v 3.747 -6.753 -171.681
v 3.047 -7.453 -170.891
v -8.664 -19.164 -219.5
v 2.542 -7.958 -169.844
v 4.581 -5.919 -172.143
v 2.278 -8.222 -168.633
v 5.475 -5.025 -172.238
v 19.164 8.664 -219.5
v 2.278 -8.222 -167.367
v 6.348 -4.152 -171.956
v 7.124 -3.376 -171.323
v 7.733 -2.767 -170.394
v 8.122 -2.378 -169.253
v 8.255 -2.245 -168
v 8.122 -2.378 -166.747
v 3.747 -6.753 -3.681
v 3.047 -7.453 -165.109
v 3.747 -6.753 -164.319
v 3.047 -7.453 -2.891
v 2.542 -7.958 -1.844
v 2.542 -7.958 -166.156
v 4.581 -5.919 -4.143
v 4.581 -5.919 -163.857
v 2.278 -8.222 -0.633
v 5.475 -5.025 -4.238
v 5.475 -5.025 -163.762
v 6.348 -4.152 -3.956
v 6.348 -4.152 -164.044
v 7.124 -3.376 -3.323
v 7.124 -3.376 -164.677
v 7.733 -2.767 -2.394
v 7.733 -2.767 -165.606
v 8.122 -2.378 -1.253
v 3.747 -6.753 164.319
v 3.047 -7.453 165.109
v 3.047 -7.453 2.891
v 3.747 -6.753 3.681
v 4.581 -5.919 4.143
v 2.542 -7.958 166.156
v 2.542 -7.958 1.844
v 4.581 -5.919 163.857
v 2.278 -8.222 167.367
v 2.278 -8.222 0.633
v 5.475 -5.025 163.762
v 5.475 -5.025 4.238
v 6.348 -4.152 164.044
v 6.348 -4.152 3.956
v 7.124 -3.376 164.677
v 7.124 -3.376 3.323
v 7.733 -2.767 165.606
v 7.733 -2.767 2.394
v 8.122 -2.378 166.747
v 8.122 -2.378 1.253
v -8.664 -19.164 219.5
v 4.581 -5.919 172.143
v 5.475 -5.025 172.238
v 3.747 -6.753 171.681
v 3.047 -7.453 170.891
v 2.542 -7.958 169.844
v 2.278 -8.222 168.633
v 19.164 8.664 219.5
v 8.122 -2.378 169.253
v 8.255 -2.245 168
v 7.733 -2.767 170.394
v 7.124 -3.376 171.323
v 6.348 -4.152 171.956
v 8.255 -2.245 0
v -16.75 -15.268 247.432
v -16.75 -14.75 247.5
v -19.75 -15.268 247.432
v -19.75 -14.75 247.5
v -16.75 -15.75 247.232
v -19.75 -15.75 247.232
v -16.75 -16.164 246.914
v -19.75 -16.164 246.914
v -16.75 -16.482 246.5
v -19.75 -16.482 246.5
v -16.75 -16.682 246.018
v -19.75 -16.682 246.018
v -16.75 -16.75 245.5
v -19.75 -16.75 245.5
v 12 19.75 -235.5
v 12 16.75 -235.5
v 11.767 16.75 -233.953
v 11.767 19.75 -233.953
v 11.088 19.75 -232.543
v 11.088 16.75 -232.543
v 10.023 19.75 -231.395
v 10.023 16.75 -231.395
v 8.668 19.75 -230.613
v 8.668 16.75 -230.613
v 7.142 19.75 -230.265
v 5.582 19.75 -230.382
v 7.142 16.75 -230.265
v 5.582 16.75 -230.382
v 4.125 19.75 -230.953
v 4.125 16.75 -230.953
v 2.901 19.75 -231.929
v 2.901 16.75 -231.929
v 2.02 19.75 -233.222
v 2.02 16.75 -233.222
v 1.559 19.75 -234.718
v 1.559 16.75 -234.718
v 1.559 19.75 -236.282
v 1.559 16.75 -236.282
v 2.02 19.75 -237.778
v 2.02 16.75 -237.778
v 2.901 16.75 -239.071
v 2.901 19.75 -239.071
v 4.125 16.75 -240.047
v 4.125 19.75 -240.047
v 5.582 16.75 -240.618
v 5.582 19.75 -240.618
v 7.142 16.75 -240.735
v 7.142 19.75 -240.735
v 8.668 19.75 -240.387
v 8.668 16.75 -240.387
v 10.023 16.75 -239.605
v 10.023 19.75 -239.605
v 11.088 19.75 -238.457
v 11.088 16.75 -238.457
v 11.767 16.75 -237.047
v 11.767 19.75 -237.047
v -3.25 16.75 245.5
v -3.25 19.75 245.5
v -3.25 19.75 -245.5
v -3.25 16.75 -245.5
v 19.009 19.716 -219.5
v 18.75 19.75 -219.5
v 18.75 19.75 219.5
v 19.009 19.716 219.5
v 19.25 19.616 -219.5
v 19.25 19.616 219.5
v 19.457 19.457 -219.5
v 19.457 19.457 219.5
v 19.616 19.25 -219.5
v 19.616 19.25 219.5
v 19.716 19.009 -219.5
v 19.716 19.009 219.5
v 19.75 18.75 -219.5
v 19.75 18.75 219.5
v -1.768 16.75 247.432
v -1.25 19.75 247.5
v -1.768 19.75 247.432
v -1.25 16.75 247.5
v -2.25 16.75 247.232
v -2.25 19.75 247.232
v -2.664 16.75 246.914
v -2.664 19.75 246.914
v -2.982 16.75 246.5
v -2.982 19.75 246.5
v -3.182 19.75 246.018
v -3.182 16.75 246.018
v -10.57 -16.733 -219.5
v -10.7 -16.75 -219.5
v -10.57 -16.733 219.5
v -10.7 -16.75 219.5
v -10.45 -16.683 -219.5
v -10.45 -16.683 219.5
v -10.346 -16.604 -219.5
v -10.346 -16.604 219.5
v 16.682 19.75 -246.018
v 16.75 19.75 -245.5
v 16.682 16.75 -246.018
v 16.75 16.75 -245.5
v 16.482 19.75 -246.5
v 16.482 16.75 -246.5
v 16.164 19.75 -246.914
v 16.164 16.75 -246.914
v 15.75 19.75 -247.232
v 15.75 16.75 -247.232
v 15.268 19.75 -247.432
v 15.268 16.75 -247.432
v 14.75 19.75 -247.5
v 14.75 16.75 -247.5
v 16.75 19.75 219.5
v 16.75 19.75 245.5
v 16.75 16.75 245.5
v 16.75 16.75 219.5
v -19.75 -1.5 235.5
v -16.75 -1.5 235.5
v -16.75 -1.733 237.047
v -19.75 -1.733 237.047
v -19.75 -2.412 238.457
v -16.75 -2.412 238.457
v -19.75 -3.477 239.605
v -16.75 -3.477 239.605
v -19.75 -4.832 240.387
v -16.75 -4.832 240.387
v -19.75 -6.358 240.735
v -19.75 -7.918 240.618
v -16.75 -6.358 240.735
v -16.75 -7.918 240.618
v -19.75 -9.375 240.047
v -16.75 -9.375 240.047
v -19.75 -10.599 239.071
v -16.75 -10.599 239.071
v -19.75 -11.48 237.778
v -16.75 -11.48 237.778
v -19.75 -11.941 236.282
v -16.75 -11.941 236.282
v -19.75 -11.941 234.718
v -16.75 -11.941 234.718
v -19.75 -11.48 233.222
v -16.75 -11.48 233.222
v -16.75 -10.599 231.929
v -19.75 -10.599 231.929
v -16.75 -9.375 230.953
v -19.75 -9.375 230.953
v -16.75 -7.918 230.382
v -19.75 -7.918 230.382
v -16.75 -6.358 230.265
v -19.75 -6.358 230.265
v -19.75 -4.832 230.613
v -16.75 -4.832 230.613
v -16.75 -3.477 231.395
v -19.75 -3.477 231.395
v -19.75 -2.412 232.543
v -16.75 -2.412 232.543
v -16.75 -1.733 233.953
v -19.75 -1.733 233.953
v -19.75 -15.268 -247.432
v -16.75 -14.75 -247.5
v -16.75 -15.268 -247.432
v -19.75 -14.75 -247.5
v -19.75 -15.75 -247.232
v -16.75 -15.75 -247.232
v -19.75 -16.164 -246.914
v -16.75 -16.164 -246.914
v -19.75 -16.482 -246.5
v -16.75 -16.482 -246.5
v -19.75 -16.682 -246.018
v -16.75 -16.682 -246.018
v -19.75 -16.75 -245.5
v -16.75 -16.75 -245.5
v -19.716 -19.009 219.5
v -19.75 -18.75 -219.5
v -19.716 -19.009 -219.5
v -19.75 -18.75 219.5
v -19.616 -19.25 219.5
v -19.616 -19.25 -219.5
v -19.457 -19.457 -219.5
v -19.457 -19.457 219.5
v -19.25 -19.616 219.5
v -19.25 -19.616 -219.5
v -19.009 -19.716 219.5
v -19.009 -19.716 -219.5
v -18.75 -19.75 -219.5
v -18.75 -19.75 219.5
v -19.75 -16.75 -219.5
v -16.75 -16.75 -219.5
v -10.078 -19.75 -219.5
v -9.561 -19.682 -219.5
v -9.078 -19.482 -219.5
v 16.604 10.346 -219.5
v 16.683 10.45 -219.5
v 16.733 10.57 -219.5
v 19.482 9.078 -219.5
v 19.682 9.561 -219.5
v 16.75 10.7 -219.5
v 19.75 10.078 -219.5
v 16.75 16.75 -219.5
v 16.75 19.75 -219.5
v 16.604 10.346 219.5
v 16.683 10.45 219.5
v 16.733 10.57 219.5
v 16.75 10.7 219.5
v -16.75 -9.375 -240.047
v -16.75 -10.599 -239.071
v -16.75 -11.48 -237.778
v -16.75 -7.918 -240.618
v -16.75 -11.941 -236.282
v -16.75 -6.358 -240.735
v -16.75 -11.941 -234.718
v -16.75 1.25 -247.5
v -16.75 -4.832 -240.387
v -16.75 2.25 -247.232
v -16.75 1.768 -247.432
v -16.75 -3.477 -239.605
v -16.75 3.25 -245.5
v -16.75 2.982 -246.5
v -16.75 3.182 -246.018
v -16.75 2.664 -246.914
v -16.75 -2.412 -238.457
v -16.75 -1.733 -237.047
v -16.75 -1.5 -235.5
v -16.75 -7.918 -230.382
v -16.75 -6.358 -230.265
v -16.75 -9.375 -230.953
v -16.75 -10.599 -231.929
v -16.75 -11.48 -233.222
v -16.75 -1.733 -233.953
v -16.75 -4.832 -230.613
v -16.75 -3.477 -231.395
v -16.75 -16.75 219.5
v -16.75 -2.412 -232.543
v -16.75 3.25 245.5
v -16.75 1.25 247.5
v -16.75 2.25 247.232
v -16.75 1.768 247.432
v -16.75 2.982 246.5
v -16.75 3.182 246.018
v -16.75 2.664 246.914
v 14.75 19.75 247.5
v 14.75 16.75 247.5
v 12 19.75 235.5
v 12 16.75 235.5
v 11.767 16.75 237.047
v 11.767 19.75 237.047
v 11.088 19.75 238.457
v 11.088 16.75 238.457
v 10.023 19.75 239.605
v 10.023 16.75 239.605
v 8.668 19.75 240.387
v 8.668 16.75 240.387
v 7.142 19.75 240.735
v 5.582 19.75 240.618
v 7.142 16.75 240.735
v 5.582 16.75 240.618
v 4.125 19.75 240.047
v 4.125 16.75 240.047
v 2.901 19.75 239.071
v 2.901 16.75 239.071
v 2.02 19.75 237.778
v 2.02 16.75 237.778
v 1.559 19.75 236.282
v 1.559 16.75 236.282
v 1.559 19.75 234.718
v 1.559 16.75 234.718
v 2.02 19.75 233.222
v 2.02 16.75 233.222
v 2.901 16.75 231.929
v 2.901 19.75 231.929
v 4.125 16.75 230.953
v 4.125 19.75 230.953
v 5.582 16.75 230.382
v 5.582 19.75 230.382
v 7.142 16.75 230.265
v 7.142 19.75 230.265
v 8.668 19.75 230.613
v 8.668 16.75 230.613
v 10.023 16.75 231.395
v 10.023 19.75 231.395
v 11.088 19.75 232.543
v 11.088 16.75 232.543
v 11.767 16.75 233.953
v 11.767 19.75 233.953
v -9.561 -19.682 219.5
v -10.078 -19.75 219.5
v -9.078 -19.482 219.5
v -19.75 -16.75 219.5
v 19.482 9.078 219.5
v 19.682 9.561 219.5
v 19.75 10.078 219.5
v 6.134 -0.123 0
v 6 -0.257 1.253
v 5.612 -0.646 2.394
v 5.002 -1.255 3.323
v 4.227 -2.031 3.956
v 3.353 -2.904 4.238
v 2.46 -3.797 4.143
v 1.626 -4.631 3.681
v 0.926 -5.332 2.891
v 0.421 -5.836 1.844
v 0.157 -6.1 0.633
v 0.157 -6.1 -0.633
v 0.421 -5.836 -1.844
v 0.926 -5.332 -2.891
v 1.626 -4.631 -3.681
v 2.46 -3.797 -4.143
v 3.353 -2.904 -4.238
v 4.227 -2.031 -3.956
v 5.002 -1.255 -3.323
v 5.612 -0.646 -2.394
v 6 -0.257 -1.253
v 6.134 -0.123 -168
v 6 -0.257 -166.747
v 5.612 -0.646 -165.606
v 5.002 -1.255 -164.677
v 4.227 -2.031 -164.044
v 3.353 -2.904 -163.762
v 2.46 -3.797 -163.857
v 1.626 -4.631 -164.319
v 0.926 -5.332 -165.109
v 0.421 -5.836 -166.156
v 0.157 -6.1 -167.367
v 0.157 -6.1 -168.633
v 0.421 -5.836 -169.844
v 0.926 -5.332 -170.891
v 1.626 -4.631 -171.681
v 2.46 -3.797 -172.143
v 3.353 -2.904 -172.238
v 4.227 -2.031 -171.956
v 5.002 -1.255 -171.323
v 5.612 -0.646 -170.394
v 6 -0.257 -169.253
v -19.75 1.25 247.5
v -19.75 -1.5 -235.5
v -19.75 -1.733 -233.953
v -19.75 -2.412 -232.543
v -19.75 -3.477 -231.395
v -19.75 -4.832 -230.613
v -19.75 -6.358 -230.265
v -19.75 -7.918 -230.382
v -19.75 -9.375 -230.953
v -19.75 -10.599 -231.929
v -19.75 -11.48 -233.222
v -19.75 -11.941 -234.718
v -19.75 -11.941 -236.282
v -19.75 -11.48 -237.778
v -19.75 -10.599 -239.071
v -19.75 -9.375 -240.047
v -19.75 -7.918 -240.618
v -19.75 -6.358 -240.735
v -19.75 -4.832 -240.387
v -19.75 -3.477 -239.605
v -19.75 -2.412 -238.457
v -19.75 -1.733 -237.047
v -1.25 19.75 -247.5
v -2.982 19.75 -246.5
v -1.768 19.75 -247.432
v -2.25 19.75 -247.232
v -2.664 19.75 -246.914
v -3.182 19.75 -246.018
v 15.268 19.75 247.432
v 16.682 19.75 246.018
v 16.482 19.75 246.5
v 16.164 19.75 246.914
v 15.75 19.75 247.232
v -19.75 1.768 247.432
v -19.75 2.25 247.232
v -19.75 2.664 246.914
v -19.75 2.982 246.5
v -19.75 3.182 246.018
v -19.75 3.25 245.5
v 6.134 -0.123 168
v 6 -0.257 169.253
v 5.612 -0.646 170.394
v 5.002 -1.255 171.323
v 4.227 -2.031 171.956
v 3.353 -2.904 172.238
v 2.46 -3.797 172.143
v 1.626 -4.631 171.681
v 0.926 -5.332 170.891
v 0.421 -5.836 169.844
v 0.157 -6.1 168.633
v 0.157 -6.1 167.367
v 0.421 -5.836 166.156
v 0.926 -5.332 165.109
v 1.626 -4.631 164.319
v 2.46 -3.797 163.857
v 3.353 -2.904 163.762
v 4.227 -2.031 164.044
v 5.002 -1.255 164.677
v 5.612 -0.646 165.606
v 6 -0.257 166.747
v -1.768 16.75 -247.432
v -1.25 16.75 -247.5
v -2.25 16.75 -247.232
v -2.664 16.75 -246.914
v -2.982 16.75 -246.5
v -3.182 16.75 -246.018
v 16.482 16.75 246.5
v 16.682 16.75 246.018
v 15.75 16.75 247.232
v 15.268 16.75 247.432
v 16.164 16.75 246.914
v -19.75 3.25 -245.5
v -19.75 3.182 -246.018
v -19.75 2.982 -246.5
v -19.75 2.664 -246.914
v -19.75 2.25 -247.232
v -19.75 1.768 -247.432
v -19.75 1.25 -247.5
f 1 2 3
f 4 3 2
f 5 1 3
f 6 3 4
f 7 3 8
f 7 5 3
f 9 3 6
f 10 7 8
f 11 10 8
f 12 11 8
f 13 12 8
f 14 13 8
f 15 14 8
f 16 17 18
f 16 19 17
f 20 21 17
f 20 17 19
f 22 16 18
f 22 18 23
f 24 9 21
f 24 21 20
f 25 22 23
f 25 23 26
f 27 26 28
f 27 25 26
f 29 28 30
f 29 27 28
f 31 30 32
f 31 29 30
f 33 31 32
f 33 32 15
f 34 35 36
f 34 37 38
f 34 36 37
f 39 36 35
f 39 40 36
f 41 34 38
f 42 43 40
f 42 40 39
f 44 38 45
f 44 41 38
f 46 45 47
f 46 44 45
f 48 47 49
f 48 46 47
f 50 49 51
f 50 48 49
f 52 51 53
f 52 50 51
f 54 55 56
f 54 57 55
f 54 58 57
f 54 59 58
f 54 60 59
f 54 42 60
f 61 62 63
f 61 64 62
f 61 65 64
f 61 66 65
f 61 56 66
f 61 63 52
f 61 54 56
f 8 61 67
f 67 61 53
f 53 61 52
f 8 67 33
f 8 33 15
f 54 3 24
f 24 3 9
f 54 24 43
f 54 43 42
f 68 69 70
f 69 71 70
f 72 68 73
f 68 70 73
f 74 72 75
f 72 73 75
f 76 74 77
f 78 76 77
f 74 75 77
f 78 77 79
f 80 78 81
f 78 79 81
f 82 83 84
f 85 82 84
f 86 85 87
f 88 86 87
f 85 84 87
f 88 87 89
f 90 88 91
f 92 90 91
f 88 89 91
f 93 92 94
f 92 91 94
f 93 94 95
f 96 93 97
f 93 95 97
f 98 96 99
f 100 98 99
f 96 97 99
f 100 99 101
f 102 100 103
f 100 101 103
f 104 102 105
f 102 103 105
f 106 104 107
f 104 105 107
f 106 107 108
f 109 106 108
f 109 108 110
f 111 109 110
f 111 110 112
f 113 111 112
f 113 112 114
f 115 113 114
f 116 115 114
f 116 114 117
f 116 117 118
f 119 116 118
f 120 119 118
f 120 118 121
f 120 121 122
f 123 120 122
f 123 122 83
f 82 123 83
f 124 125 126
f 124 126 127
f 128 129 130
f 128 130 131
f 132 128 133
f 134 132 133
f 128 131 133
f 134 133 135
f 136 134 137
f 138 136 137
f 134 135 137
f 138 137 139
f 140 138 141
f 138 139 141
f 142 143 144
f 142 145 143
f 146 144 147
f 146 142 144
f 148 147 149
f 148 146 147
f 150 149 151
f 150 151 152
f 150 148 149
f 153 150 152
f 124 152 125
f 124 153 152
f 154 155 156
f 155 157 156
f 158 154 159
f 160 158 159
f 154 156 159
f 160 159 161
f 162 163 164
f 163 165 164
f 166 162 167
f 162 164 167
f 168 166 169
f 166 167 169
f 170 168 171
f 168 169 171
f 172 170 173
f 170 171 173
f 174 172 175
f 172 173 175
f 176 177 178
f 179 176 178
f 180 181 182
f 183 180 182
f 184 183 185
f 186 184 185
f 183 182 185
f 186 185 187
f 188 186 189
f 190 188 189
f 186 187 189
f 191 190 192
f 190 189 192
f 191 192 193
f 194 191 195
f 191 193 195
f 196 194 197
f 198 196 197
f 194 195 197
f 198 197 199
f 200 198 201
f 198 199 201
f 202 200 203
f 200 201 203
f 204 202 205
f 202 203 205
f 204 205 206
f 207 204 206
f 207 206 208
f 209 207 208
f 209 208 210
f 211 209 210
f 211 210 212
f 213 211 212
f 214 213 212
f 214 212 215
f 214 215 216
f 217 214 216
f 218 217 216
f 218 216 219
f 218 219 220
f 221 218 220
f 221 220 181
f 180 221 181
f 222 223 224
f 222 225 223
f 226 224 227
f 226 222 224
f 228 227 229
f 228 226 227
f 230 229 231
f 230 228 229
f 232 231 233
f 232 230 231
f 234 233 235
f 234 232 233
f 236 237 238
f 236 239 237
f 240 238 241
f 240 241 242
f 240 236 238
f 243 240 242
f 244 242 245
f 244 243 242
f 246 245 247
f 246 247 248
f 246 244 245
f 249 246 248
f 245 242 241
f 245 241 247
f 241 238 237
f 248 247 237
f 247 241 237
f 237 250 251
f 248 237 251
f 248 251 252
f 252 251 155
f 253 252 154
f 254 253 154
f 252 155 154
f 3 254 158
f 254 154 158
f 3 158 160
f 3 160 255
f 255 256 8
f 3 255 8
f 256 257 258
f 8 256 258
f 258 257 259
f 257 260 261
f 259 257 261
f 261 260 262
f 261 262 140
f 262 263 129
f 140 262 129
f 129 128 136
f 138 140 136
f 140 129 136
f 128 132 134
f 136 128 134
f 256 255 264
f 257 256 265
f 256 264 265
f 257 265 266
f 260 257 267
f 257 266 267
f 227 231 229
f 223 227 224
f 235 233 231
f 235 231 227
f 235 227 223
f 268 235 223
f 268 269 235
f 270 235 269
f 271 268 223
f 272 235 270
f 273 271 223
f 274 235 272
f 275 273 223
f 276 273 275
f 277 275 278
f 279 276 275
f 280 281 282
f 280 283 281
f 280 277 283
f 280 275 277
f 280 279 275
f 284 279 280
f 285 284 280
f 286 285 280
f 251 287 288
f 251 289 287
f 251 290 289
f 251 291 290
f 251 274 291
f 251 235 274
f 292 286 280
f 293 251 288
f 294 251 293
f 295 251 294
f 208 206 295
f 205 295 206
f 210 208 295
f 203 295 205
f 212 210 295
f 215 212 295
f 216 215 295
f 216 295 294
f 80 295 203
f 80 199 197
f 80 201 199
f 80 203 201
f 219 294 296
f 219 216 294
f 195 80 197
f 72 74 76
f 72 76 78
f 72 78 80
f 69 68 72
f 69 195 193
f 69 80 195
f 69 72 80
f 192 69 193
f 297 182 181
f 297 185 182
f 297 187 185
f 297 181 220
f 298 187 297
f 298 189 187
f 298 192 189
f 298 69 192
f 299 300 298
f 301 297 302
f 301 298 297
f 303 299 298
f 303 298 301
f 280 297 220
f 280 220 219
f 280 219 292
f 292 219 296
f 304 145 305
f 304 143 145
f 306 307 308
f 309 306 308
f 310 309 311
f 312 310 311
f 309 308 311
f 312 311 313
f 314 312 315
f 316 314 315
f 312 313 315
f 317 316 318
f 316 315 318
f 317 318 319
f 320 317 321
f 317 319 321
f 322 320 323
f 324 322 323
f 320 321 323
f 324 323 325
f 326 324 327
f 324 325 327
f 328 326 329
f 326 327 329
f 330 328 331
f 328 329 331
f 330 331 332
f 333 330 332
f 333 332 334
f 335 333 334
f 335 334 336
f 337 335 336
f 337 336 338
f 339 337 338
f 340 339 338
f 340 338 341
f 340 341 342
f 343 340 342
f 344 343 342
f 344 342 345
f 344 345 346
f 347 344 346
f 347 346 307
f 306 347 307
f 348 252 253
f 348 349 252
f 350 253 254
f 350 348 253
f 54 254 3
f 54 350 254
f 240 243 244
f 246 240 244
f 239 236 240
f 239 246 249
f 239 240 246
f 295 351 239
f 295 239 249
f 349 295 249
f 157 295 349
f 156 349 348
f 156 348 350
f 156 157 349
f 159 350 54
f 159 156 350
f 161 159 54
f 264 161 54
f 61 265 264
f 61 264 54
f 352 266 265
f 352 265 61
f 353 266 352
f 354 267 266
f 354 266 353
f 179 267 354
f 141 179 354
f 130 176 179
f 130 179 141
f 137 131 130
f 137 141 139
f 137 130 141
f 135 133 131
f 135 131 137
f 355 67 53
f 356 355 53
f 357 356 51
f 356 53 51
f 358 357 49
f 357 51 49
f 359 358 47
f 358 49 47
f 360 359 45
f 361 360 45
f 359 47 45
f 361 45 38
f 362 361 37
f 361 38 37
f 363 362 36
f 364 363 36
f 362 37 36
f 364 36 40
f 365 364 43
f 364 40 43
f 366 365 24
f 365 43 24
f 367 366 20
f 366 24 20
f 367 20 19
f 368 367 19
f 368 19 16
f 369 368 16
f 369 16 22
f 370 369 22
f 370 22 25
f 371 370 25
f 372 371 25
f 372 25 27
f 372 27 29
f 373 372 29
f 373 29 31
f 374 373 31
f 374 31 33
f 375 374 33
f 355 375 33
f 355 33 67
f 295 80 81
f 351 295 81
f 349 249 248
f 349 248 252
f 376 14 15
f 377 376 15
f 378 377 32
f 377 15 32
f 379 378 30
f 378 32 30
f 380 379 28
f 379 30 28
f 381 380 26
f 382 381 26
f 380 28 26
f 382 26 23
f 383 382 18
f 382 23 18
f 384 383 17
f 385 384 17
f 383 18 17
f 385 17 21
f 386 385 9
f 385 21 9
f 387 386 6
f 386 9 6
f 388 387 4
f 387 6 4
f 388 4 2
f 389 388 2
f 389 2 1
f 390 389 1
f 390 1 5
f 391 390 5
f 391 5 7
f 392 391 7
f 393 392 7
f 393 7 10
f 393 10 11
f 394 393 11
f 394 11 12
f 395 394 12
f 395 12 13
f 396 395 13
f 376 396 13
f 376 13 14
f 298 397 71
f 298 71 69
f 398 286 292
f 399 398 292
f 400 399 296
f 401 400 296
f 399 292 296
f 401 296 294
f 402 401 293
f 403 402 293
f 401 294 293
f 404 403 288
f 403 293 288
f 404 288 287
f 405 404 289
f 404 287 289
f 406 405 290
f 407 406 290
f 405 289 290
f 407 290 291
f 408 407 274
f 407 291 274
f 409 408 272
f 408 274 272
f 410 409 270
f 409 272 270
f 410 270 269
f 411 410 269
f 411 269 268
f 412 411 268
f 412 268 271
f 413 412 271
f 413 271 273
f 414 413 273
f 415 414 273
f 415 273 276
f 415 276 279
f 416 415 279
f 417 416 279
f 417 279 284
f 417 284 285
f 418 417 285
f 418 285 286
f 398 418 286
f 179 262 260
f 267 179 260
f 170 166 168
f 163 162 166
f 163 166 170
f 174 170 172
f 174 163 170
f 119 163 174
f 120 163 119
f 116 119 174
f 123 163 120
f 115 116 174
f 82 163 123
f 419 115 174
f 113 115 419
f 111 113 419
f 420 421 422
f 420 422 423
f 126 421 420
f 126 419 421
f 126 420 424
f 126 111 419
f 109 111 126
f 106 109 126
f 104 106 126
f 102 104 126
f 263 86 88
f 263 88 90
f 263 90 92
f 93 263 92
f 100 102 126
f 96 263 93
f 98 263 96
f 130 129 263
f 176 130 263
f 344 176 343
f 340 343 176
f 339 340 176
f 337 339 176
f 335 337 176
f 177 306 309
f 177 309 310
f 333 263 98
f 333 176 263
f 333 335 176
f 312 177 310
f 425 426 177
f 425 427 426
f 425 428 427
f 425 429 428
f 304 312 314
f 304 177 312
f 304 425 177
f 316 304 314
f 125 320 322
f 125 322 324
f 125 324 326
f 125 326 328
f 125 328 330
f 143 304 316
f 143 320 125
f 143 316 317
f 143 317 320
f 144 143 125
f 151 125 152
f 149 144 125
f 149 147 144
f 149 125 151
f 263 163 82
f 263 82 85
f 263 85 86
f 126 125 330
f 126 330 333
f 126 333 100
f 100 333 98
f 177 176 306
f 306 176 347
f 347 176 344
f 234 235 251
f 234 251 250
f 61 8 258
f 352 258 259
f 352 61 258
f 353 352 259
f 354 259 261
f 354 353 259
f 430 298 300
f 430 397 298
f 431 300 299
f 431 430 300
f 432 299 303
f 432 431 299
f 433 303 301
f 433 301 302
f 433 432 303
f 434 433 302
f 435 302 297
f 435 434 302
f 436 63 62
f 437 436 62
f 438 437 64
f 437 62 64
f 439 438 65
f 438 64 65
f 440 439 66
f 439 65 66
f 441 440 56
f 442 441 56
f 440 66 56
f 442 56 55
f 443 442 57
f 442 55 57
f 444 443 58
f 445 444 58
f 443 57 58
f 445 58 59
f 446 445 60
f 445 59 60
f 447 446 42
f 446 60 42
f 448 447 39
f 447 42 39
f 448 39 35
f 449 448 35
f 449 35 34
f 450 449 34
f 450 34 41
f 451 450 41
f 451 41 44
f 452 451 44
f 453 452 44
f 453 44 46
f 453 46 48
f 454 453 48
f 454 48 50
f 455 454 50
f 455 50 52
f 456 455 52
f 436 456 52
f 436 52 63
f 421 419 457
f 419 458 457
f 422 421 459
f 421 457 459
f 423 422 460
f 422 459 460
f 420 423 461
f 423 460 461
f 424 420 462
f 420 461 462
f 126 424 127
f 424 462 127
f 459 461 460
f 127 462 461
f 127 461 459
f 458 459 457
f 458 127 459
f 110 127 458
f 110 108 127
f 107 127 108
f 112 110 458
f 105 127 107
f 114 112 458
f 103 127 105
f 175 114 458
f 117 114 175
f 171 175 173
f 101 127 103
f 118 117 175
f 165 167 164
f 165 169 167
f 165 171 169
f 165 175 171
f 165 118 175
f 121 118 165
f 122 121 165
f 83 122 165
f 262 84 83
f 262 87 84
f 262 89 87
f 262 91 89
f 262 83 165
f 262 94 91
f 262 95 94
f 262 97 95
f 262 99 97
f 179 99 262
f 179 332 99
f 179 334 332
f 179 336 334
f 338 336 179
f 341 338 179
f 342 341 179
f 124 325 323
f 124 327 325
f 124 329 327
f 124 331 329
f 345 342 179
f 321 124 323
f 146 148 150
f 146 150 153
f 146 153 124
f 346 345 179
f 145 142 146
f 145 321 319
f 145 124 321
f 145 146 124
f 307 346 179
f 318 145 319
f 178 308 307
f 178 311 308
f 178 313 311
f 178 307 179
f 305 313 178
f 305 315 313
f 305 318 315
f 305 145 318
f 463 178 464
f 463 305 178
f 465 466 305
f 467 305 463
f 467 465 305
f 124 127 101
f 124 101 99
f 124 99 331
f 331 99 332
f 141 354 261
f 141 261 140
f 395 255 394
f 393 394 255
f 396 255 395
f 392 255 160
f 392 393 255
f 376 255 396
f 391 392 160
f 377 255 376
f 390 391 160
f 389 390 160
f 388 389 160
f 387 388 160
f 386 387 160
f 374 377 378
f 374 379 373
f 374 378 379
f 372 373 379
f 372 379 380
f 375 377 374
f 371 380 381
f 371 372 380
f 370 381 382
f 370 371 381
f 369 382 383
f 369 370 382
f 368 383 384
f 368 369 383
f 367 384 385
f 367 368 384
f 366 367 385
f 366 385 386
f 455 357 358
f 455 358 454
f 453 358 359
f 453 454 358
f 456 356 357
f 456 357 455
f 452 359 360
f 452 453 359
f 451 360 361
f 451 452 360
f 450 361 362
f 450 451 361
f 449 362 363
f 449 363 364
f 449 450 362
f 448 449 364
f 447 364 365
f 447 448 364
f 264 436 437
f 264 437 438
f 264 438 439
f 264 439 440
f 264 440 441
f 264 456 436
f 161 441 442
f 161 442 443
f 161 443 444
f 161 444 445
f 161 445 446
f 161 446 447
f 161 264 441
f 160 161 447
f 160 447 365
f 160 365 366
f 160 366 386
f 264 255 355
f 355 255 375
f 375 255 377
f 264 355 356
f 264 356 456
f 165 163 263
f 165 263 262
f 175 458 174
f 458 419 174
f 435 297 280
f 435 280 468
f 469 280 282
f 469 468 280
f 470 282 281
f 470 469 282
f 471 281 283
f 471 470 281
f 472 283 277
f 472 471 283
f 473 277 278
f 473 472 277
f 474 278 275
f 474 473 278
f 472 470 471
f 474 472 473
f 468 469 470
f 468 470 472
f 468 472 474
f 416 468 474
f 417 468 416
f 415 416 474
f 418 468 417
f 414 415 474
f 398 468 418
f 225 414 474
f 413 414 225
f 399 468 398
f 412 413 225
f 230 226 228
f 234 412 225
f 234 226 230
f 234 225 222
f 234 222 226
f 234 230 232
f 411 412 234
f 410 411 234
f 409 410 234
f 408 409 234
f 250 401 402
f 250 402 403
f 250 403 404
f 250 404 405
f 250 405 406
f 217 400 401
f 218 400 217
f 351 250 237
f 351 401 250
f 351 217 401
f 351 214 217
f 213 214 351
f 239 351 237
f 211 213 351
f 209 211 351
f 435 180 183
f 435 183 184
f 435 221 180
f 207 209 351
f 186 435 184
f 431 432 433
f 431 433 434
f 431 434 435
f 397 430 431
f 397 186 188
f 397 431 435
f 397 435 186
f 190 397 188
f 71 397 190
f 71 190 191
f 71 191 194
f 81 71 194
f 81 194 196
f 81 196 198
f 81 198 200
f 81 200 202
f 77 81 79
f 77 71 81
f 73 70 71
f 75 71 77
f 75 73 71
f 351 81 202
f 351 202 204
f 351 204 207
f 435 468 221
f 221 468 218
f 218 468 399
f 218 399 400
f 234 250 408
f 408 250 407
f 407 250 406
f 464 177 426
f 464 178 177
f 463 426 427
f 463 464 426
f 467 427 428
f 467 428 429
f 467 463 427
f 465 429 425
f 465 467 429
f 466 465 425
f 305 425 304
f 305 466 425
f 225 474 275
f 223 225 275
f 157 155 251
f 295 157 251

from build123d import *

# Parameters (mm, degrees)
F1_DEPTH = 247.5
F3_DEPTH = 28
F4_R     = 4.25
F5_DEPTH = 25
F6_R     = 5.25
F7_DEPTH = 25
F8_R     = 5.25
F9_DEPTH = 25
F10_R    = 2
F11_R    = 0.5
F12_R    = 1


# Not quite as in the source:
# - a pattern or mirror of a feature is missing from the dataset's text; its kind, count and spacing are read off the source's solid


with BuildPart() as f1:
    # F0 (on Top) → F1 (new body, symmetric)
    with BuildSketch(Plane.XY):
        Polygon((-19.75, 3.25), (-19.75, -19.75), (-9.25, -19.75), (19.75, 9.25), (19.75, 19.75), (-3.25, 19.75), (-3.25, 16.75), (16.75, 16.75), (16.75, 10.4926406871), (-10.4926406871, -16.75), (-16.75, -16.75), (-16.75, 3.25), align=None)
    extrude(amount=F1_DEPTH, both=True)

    # F2 (on face) → F3 (cut)
    with BuildSketch(Plane.XY.offset(247.5)):
        Polygon((-10.4926406871, -16.75), (-16.75, -16.75), (-19.75, -16.75), (-19.75, -19.75), (-9.25, -19.75), (19.75, 9.25), (19.75, 19.75), (16.75, 19.75), (16.75, 16.75), (16.75, 10.4926406871), align=None)
    f3 = extrude(amount=-F3_DEPTH, mode=Mode.SUBTRACT)

    # F3_copies: F3 across plane
    add(f3.mirror(Plane(origin=(0, 0, 0), x_dir=(-1, 0, 0), z_dir=(0, 0, -1))), mode=Mode.SUBTRACT)

    # F4 (on face) → F5 (cut)
    with BuildSketch(Plane(origin=(5.25, -5.25, 0), x_dir=(0.7071067812, 0.7071067812, 0), z_dir=(0.7071067812, -0.7071067812, 0))):
        with Locations((0, 168)):
            Circle(F4_R)
        with Locations((0, -168)):
            Circle(F4_R)
        Circle(F4_R)
    extrude(amount=-F5_DEPTH, mode=Mode.SUBTRACT)

    # F6 (on face) → F7 (cut)
    with BuildSketch(Plane.YZ.offset(-16.75)):
        with Locations((-6.75, 235.5)):
            Circle(F6_R)
        with Locations((-6.75, -235.5)):
            Circle(F6_R)
    extrude(amount=-F7_DEPTH, mode=Mode.SUBTRACT)

    # F8 (on face) → F9 (cut)
    with BuildSketch(Plane.XZ.offset(-16.75)):
        with Locations((6.75, 235.5)):
            Circle(F8_R)
        with Locations((6.75, -235.5)):
            Circle(F8_R)
    extrude(amount=-F9_DEPTH, mode=Mode.SUBTRACT)

    # F10
    f10_edges = [f1.edges().sort_by_distance(p)[0] for p in [
        (-9.25, -19.75, 0),
        (19.75, 9.25, 0),
        (-18.25, -16.75, 247.5),
        (-18.25, 3.25, 247.5),
        (-3.25, 18.25, 247.5),
        (16.75, 18.25, 247.5),
        (-18.25, 3.25, -247.5),
        (-3.25, 18.25, -247.5),
        (-18.25, -16.75, -247.5),
        (16.75, 18.25, -247.5),
    ]]
    fillet(f10_edges, radius=F10_R)

    # F11
    f11_edges = [f1.edges().sort_by_distance(p)[0] for p in [
        (-10.492641, -16.75, 0),
        (16.75, 10.492641, 0),
    ]]
    fillet(f11_edges, radius=F11_R)

    # F12
    f12_edges = [f1.edges().sort_by_distance(p)[0] for p in [
        (-19.75, -19.75, 0),
        (19.75, 19.75, 0),
    ]]
    fillet(f12_edges, radius=F12_R)


solid = f1.part
